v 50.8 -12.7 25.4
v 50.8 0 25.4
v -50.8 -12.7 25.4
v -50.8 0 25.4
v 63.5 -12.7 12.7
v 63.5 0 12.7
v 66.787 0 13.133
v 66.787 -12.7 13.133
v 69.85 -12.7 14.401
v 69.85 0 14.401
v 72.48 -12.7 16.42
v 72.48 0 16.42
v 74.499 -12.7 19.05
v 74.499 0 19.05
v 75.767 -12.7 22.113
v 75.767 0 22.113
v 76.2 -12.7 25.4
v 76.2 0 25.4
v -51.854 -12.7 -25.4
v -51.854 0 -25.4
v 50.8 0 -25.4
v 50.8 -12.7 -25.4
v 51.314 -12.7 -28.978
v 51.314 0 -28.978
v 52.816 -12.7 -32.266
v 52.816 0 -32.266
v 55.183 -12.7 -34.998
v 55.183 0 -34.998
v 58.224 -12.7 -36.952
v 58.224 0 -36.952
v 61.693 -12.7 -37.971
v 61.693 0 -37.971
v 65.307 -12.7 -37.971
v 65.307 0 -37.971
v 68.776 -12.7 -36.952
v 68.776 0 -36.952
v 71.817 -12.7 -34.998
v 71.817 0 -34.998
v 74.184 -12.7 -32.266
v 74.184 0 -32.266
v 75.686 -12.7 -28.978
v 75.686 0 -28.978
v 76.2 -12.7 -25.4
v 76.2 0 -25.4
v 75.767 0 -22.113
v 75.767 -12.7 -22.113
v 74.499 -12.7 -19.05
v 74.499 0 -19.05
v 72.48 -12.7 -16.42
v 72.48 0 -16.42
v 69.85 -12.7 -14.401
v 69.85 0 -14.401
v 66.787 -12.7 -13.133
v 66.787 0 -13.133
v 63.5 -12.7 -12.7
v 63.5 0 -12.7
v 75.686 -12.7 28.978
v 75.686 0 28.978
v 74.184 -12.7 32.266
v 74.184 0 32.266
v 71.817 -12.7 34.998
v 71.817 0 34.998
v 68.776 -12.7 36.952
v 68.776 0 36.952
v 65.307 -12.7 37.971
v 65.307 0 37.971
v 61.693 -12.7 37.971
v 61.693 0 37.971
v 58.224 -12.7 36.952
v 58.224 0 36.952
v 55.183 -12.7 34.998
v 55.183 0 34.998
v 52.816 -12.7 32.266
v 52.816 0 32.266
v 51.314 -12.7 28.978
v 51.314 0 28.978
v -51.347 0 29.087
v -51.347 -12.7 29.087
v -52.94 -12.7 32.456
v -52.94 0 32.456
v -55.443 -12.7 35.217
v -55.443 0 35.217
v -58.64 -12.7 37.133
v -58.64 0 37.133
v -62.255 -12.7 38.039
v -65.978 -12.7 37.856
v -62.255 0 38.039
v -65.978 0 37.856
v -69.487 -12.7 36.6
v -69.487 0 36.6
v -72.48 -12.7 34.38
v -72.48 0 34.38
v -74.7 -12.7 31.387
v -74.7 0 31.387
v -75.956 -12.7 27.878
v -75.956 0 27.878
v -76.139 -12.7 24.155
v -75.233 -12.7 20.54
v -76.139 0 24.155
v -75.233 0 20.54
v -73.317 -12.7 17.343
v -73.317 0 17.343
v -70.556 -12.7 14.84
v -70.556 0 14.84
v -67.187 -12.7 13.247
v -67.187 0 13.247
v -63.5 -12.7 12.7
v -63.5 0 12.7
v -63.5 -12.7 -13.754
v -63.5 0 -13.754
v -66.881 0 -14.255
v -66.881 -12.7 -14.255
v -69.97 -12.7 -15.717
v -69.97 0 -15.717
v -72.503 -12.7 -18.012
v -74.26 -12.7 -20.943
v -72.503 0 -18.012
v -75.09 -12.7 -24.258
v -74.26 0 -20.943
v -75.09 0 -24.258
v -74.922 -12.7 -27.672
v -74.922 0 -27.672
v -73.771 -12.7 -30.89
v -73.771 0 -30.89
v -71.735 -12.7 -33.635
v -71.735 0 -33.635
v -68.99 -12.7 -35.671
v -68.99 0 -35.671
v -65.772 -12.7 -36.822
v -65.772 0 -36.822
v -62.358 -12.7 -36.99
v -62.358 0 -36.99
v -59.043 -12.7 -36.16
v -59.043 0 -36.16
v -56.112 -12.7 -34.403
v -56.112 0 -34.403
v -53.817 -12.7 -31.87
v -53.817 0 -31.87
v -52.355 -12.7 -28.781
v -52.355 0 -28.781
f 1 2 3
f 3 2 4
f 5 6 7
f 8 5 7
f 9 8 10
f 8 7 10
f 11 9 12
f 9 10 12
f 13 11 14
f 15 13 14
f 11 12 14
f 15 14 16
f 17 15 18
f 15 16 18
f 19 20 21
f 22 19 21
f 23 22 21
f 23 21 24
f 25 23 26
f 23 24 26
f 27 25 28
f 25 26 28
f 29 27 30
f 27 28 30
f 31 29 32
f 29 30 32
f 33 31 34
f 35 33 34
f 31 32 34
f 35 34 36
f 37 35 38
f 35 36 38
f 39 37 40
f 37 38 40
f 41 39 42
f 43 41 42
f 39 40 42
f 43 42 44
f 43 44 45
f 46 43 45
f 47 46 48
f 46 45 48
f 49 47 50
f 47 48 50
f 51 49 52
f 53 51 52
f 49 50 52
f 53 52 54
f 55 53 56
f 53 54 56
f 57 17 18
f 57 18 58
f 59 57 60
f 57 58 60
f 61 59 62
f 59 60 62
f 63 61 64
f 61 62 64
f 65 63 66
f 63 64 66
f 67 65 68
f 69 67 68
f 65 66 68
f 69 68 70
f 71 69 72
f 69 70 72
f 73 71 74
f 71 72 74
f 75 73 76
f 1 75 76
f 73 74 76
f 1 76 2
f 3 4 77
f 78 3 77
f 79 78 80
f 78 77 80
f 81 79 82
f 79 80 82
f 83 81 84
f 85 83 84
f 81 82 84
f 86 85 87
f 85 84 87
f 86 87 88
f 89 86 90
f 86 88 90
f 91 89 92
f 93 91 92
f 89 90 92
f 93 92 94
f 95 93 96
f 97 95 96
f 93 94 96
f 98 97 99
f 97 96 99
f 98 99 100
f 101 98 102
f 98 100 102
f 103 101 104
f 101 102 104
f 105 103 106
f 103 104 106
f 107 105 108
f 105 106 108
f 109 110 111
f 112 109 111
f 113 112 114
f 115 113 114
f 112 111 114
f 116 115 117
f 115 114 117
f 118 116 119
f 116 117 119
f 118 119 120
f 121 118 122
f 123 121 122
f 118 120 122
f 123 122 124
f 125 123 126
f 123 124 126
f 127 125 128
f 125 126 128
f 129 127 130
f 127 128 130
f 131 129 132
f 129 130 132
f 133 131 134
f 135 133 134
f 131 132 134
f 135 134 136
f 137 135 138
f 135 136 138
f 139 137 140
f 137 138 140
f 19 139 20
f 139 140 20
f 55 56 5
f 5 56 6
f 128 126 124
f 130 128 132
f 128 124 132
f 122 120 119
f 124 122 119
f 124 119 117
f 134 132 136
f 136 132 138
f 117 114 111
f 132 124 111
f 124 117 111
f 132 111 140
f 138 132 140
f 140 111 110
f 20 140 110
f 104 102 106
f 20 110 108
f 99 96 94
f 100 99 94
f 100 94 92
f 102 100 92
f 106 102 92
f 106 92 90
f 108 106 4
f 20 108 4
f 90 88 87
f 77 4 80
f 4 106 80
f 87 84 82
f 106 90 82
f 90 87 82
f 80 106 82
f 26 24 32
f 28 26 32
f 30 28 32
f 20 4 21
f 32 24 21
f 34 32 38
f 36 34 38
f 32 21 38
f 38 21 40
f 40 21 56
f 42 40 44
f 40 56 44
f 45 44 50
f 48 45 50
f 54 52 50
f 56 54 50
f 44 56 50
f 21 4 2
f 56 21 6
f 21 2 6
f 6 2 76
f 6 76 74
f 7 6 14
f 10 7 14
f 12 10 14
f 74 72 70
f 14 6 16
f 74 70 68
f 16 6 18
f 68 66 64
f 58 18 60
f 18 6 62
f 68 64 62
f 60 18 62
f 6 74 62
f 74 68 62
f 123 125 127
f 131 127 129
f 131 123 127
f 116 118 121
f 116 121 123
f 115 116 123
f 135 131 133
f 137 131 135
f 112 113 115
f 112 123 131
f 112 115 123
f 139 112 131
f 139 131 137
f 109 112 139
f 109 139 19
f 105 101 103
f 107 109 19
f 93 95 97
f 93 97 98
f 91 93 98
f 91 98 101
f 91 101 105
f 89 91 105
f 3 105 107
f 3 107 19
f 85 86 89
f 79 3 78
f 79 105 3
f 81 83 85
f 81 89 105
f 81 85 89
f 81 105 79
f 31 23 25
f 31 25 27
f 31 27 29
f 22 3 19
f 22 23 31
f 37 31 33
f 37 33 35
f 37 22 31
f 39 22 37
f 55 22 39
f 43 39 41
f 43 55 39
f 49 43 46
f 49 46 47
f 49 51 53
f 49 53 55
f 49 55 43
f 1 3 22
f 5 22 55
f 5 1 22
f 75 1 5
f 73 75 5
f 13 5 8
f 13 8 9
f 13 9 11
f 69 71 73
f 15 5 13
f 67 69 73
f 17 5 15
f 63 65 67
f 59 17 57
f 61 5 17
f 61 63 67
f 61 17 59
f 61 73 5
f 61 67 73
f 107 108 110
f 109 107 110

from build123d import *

# Parameters (mm, degrees)
F1_DEPTH = 12.7


with BuildPart() as f1:
    # F0 (on Front) → F1 (new body)
    with BuildSketch(Plane.XZ):
        with BuildLine():
            ThreePointArc((-63.5, 12.7), (-54.5197438789, 16.4197438789), (-50.8, 25.4))
            Line((-50.8, 25.4), (-63.5, 25.4))
            Line((-63.5, 25.4), (-63.5, 12.7))
        make_face()
        with BuildLine():
            Line((-63.5, 25.4), (-50.8, 25.4))
            ThreePointArc((-50.8, 25.4), (-72.4802561211, 34.3802561211), (-63.5, 12.7))
            Line((-63.5, 12.7), (-63.5, 25.4))
        make_face()
        with BuildLine():
            Line((50.8, 25.4), (-50.8, 25.4))
            ThreePointArc((-50.8, 25.4), (-54.5197438789, 16.4197438789), (-63.5, 12.7))
            Line((-63.5, 12.7), (-63.5, -13.7539286115))
            ThreePointArc((-63.5, -13.7539286115), (-55.264983947, -17.164983947), (-51.8539286115, -25.4))
            Line((-51.8539286115, -25.4), (50.8, -25.4))
            ThreePointArc((50.8, -25.4), (54.5197438789, -16.4197438789), (63.5, -12.7))
            Line((63.5, -12.7), (63.5, 12.7))
            ThreePointArc((63.5, 12.7), (54.5197438789, 16.4197438789), (50.8, 25.4))
        make_face()
        with BuildLine():
            ThreePointArc((76.2, 25.4), (63.5, 38.1), (50.8, 25.4))
            Line((50.8, 25.4), (63.5, 25.4))
            Line((63.5, 25.4), (63.5, 12.7))
            ThreePointArc((63.5, 12.7), (72.4802561211, 16.4197438789), (76.2, 25.4))
        make_face()
        with BuildLine():
            Line((63.5, 25.4), (50.8, 25.4))
            ThreePointArc((50.8, 25.4), (54.5197438789, 16.4197438789), (63.5, 12.7))
            Line((63.5, 12.7), (63.5, 25.4))
        make_face()
        with BuildLine():
            ThreePointArc((-51.8539286115, -25.4), (-55.264983947, -17.164983947), (-63.5, -13.7539286115))
            Line((-63.5, -13.7539286115), (-63.5, -25.4))
            Line((-63.5, -25.4), (-51.8539286115, -25.4))
        make_face()
        with BuildLine():
            Line((-63.5, -25.4), (-63.5, -13.7539286115))
            ThreePointArc((-63.5, -13.7539286115), (-71.735016053, -33.635016053), (-51.8539286115, -25.4))
            Line((-51.8539286115, -25.4), (-63.5, -25.4))
        make_face()
        with BuildLine():
            ThreePointArc((76.2, -25.4), (72.4802561211, -16.4197438789), (63.5, -12.7))
            Line((63.5, -12.7), (63.5, -25.4))
            Line((63.5, -25.4), (50.8, -25.4))
            ThreePointArc((50.8, -25.4), (63.5, -38.1), (76.2, -25.4))
        make_face()
        with BuildLine():
            Line((63.5, -25.4), (63.5, -12.7))
            ThreePointArc((63.5, -12.7), (54.5197438789, -16.4197438789), (50.8, -25.4))
            Line((50.8, -25.4), (63.5, -25.4))
        make_face()
    extrude(amount=F1_DEPTH)


solid = f1.part
